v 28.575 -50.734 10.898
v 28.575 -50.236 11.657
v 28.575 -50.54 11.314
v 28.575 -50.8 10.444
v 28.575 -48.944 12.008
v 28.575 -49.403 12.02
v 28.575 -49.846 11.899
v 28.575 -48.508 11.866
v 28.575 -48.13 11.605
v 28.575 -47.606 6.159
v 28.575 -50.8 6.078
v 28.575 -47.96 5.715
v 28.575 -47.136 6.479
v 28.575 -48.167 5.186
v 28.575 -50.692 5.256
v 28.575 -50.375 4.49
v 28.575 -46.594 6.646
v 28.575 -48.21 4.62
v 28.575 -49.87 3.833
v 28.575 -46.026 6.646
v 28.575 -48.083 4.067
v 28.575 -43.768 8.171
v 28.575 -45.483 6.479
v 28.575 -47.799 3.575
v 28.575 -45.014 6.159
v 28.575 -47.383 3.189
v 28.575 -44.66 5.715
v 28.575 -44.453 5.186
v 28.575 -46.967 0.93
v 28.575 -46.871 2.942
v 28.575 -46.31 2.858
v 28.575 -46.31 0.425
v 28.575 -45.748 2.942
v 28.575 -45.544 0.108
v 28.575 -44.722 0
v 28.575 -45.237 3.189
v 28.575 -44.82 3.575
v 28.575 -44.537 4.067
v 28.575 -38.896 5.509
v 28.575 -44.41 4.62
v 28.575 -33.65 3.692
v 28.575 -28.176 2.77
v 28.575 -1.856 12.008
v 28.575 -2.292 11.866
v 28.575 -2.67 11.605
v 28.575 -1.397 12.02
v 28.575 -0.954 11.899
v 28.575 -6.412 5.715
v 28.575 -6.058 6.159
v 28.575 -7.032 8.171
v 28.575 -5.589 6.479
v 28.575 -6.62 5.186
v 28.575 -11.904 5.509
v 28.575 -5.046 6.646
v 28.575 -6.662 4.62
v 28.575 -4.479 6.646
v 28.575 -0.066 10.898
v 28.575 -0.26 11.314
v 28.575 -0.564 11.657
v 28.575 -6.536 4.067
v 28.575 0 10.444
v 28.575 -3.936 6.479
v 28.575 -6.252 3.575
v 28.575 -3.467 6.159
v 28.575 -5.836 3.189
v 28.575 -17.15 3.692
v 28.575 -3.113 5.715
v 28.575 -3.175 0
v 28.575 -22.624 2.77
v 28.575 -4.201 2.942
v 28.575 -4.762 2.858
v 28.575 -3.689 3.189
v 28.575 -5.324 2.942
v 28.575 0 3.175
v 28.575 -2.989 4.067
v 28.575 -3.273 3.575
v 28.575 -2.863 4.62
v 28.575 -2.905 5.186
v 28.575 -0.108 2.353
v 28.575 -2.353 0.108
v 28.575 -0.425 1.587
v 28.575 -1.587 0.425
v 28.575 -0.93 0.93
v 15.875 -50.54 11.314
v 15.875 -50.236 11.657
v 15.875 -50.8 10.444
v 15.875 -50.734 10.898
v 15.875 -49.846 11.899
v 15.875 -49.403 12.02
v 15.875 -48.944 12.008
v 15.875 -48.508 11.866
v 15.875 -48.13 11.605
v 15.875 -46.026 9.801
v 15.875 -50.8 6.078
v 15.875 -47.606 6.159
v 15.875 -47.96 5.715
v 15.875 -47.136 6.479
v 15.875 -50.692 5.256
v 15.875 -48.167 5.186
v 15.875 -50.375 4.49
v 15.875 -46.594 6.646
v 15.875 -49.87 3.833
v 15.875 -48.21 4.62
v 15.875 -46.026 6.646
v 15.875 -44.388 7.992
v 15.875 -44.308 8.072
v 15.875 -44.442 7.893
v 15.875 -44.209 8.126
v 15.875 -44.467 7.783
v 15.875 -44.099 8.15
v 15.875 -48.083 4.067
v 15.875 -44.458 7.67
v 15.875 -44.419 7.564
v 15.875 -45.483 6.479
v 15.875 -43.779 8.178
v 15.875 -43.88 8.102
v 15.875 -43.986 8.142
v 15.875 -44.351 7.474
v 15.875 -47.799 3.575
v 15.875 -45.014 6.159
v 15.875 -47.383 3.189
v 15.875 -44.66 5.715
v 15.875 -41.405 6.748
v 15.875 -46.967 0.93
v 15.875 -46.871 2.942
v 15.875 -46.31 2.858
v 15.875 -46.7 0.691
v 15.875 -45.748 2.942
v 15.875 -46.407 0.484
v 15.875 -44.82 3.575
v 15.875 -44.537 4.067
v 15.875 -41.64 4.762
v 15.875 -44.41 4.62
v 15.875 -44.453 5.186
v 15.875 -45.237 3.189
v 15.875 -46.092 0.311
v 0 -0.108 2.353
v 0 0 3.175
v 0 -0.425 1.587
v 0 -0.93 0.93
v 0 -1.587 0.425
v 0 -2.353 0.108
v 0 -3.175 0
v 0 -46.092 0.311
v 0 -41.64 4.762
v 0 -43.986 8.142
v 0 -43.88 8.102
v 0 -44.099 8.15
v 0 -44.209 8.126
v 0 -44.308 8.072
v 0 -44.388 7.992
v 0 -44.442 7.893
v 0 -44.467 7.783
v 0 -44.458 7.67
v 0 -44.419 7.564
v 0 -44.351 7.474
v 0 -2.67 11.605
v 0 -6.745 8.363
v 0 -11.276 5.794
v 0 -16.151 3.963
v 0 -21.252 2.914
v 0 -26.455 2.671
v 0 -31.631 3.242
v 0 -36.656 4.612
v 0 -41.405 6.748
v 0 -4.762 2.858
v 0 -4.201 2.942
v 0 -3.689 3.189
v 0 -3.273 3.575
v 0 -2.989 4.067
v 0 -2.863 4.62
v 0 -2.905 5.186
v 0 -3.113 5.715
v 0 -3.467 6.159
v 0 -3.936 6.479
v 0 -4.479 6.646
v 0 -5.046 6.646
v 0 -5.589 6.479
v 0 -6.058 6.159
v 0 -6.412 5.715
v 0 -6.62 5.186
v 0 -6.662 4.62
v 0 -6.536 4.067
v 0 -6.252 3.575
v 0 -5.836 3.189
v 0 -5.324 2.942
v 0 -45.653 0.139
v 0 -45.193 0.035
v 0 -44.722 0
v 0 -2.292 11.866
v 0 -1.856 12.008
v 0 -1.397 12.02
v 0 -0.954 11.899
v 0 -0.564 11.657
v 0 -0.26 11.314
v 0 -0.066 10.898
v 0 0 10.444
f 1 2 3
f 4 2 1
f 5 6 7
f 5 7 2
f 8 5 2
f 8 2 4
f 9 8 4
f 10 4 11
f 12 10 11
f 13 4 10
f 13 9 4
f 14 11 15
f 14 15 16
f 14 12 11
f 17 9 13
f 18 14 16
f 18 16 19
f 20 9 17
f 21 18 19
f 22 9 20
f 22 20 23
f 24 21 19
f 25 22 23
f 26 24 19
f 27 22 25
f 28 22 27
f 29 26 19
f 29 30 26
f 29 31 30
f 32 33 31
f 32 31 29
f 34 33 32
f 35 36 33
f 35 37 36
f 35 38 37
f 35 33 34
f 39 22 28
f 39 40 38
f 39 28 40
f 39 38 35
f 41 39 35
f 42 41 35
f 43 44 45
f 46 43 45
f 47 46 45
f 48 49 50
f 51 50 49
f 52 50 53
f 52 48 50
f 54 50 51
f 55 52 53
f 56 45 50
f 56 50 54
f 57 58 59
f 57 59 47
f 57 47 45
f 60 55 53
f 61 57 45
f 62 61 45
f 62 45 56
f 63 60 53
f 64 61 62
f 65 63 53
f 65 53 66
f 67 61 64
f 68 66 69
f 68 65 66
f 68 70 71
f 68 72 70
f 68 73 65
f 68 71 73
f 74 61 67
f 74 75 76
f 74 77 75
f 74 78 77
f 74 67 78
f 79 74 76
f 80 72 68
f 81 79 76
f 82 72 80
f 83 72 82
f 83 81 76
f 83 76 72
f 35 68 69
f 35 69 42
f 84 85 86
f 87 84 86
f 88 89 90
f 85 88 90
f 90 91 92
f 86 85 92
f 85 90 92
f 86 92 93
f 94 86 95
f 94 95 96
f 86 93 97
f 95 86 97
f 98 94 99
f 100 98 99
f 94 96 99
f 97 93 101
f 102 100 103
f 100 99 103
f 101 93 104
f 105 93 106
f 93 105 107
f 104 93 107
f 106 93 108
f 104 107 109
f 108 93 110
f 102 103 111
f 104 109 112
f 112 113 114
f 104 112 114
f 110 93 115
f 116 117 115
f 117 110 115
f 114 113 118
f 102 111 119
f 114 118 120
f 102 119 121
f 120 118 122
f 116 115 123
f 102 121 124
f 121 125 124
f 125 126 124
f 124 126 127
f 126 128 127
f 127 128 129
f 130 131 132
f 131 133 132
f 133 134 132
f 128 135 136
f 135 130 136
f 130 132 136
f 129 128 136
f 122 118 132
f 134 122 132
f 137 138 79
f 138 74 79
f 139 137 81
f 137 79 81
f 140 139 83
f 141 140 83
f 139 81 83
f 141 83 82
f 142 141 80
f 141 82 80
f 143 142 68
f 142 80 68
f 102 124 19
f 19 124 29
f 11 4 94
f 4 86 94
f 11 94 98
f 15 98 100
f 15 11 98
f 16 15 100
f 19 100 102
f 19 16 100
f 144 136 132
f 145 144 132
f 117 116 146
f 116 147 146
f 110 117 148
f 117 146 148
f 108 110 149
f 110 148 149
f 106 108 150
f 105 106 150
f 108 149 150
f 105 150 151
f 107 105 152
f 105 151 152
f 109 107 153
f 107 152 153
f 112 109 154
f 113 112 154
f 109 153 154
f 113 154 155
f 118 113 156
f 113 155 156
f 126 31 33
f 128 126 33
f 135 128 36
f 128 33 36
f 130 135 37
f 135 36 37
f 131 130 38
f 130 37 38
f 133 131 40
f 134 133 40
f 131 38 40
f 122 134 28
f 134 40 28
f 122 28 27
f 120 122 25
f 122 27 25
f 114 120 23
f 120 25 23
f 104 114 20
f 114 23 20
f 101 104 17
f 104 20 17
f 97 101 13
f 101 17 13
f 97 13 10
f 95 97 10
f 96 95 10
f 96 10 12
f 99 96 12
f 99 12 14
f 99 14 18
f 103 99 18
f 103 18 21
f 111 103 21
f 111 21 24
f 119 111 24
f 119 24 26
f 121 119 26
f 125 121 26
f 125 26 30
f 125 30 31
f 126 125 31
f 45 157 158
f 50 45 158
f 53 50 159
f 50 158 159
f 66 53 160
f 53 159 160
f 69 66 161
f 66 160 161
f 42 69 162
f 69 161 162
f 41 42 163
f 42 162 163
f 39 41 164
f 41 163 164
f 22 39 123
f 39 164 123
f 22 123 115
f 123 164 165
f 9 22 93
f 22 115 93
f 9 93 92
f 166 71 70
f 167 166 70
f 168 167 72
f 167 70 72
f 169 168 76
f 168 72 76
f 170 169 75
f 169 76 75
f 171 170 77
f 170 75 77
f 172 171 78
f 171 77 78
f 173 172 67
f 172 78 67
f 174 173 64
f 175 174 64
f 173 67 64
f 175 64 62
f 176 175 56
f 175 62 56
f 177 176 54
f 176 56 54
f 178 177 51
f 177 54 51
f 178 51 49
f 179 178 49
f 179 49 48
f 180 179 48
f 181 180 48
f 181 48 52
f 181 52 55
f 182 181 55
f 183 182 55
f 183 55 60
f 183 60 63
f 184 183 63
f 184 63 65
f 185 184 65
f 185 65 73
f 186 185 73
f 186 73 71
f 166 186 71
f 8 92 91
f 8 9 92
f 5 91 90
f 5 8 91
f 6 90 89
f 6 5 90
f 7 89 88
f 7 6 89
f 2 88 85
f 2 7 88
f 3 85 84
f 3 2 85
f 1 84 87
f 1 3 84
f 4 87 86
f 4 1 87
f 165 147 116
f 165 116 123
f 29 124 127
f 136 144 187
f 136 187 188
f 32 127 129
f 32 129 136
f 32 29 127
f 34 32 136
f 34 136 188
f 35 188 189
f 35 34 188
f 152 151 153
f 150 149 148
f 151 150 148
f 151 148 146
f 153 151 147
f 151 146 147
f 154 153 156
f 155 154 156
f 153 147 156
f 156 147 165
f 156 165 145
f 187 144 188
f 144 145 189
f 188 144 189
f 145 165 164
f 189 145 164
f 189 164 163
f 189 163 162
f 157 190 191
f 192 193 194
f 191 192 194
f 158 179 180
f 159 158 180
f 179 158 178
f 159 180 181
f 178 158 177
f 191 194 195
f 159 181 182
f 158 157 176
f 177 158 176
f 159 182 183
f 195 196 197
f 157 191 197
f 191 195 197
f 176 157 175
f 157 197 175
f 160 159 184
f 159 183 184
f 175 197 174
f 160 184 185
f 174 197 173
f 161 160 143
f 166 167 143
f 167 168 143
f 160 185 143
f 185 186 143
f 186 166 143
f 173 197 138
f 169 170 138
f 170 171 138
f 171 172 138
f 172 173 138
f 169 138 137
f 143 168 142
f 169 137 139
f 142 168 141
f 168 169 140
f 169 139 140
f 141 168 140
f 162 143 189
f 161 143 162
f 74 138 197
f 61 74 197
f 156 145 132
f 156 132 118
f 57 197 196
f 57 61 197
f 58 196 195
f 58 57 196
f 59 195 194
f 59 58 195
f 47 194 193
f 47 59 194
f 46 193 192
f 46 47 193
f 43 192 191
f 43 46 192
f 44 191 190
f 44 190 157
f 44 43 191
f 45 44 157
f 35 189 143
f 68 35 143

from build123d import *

# Parameters (mm, degrees)
BOSS_EXTRUDE1_DEPTH = 28.575
CHAMFER1_SIZE       = 4.7625
FILLET3_R           = 3.175
CUT_EXTRUDE1_START  = -12.7
CUT_EXTRUDE1_DEPTH  = 48.337684469
FILLET4_R           = 0.396875
FILLET5_R           = 3.175
FILLET6_R           = 1.5875
SKETCH3_R           = 1.905
CUT_EXTRUDE2_DEPTH  = 60.514034165


with BuildPart() as part:
    # Sketch1 → Boss-Extrude1 (new body)
    with BuildSketch(Plane(origin=(0, 0, 0), x_dir=(0, 0, -1), z_dir=(1, 0, 0))):
        with BuildLine():
            Line((0, 0), (-14.399754562, 0))
            ThreePointArc((-14.399754562, 0), (-2.654588994, -25.4), (-14.399754562, -50.8))
            Line((-14.399754562, -50.8), (0, -50.8))
            Line((0, -50.8), (0, 0))
        make_face()
    extrude(amount=BOSS_EXTRUDE1_DEPTH)

    # Chamfer1
    chamfer1_edges = [part.edges().sort_by_distance(p)[0] for p in [
        (14.2875, -50.8, 0),
    ]]
    chamfer(chamfer1_edges, length=CHAMFER1_SIZE)

    # Fillet3
    fillet3_edges = [part.edges().sort_by_distance(p)[0] for p in [
        (14.2875, -46.0375, 0),
        (14.2875, -50.8, 4.7625),
    ]]
    fillet(fillet3_edges, radius=FILLET3_R)

    # Sketch2 → Cut-Extrude1 (cut, through all)
    with BuildSketch(Plane(origin=(28.575, 0, 0), x_dir=(0, 0, -1), z_dir=(1, 0, 0)).offset(CUT_EXTRUDE1_START)):
        with BuildLine():
            Line((-9.432233183, -46.30987194), (-6.747973263, -41.405330404))
            ThreePointArc((-6.747973263, -41.405330404), (-10.143469679, -46.453213193), (-14.399754562, -50.8))
            Line((-14.399754562, -50.8), (-6.077628061, -50.8))
            ThreePointArc((-6.077628061, -50.8), (-4.862608163, -50.558317516), (-3.83256403, -49.87006403))
            Line((-3.83256403, -49.87006403), (-0.92993597, -46.96743597))
            ThreePointArc((-0.92993597, -46.96743597), (-0.583051244, -46.556064021), (-0.31061766, -46.092021096))
            Line((-0.31061766, -46.092021096), (-4.7625, -41.640138757))
            Line((-4.7625, -41.640138757), (-9.432233183, -46.30987194))
        make_face()
    extrude(amount=-CUT_EXTRUDE1_DEPTH, mode=Mode.SUBTRACT)

    # Fillet4
    fillet4_edges = [part.edges().sort_by_distance(p)[0] for p in [
        (7.9375, -46.30987194, 9.432233183),
    ]]
    fillet(fillet4_edges, radius=FILLET4_R)

    # Fillet5
    fillet5_edges = [part.edges().sort_by_distance(p)[0] for p in [
        (14.2875, 0, 0),
    ]]
    fillet(fillet5_edges, radius=FILLET5_R)

    # Fillet6
    fillet6_edges = [part.edges().sort_by_distance(p)[0] for p in [
        (22.225, -50.8, 14.399754562),
        (14.2875, 0, 14.399754562),
    ]]
    fillet(fillet6_edges, radius=FILLET6_R)

    # Sketch3 → Cut-Extrude2 (cut, through all)
    with BuildSketch(Plane(origin=(28.575, 0, 0), x_dir=(0, 0, -1), z_dir=(1, 0, 0))):
        with Locations((-4.7625, -4.7625)):
            Circle(SKETCH3_R)
        with Locations((-4.7625, -46.309871939)):
            Circle(SKETCH3_R)
    extrude(amount=-CUT_EXTRUDE2_DEPTH, mode=Mode.SUBTRACT)


solid = part.part
